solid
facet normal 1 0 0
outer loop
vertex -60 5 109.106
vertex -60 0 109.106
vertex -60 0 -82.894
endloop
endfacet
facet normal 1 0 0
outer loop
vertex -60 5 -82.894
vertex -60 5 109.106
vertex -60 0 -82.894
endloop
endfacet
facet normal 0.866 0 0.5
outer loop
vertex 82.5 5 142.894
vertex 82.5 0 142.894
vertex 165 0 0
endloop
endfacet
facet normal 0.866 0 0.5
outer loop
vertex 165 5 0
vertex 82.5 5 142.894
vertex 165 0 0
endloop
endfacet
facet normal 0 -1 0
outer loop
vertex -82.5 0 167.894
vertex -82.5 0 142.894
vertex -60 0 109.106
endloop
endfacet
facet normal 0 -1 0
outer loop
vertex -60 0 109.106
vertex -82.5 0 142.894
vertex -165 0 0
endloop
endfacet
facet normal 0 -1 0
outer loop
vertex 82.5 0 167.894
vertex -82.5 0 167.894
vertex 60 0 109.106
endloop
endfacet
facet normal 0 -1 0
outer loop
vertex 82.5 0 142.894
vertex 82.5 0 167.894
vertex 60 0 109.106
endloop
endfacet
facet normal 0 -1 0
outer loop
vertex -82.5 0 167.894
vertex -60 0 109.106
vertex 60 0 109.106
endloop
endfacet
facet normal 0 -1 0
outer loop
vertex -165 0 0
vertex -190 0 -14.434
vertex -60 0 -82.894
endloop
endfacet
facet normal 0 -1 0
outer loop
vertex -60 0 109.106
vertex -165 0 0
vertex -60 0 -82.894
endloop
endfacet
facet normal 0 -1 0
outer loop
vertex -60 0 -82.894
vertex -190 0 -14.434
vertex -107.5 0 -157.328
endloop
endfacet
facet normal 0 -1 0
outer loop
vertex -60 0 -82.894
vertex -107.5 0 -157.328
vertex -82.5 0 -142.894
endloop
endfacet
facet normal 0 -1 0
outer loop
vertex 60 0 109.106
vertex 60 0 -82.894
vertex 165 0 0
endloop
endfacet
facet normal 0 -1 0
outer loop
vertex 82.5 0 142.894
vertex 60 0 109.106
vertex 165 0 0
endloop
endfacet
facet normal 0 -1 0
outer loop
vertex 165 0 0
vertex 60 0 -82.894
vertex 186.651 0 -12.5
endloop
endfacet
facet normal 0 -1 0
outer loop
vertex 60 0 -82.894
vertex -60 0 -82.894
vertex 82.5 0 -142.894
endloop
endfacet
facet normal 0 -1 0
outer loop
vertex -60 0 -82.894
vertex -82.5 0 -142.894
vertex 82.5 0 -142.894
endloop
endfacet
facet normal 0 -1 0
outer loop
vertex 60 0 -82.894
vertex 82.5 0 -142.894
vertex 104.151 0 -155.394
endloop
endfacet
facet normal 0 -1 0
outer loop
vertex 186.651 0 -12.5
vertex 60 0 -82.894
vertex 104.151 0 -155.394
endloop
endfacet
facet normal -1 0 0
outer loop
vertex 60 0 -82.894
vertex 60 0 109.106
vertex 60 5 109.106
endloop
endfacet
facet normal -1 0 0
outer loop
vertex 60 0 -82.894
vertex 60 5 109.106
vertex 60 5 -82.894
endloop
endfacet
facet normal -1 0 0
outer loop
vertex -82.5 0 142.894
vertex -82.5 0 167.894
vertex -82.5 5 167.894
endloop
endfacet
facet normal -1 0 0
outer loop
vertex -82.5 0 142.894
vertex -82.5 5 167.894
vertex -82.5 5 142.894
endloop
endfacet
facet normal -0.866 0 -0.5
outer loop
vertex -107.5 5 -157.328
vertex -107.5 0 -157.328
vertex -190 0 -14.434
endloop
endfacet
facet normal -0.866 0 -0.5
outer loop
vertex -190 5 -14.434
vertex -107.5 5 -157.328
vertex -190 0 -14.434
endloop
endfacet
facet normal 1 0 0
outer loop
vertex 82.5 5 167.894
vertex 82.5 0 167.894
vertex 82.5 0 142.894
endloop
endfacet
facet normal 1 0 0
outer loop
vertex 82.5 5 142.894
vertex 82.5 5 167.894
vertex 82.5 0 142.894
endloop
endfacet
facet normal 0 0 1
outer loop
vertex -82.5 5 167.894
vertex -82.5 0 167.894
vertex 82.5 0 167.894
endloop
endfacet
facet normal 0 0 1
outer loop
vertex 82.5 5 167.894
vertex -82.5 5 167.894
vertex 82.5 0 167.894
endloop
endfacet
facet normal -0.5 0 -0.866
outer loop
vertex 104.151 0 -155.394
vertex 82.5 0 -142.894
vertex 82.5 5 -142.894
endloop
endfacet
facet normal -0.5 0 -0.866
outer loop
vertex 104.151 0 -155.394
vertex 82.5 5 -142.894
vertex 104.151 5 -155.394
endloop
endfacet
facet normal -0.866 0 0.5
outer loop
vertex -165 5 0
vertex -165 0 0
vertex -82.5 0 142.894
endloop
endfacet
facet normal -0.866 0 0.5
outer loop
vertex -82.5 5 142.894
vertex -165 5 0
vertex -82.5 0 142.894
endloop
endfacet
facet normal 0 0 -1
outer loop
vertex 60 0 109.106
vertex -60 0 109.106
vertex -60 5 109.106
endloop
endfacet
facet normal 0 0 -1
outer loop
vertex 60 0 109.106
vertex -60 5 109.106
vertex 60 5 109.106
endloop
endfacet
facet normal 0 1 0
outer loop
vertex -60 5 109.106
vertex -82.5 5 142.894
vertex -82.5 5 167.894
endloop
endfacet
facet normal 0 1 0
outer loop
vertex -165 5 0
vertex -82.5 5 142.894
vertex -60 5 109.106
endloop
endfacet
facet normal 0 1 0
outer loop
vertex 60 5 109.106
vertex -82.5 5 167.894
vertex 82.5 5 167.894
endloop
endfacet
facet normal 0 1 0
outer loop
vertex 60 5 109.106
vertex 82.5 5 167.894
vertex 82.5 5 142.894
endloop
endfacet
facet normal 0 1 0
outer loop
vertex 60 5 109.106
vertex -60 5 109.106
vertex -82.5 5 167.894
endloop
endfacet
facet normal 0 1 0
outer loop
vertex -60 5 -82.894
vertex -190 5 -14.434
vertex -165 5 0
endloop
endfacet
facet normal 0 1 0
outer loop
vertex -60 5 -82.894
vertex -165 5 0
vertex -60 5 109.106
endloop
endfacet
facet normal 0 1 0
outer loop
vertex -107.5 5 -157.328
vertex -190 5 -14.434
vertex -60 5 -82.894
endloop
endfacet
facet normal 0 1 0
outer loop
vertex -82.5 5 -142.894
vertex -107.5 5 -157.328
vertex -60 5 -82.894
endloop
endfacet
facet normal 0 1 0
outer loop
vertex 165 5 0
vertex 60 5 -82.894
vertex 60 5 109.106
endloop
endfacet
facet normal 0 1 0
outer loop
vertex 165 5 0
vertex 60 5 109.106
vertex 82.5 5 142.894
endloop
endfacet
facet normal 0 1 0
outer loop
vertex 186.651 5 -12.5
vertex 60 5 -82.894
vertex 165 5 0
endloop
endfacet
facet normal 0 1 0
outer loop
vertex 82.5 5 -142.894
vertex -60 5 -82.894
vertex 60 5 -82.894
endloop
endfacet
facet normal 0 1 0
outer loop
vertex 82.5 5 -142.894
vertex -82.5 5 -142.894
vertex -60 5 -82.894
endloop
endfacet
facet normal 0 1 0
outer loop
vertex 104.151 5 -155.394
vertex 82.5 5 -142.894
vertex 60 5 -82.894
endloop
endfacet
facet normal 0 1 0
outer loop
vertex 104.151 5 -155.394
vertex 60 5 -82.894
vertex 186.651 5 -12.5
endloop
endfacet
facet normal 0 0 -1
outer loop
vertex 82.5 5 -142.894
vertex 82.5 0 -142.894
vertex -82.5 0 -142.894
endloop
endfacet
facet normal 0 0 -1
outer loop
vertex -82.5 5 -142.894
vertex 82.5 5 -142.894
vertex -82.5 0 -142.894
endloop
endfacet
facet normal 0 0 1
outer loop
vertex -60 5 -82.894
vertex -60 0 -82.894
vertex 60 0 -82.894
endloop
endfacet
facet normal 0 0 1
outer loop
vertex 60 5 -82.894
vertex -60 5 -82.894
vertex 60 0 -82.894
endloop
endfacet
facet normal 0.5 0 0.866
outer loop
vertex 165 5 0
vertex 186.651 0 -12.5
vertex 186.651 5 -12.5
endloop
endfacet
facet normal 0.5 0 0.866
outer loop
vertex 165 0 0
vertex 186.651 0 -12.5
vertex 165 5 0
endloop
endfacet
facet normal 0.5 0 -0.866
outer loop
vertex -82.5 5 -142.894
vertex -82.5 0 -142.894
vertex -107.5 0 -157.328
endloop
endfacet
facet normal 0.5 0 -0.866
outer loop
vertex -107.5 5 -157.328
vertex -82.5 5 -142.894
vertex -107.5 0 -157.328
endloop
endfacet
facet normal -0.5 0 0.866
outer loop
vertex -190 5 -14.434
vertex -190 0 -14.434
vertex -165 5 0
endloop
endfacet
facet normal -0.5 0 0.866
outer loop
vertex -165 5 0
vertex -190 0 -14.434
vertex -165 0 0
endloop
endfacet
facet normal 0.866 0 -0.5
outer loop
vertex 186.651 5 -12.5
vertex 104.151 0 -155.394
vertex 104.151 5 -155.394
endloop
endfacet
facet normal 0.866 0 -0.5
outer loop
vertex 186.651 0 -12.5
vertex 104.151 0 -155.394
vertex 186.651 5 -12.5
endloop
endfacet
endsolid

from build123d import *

# Parameters (mm, degrees)
SKETCH1_W           = 120
SKETCH1_H           = 192
SKETCH1_W_2         = 165
SKETCH1_H_2         = 25
BOSS_EXTRUDE2_DEPTH = 5


with BuildPart() as part:
    # Sketch1 → Boss-Extrude2 (new body)
    with BuildSketch(Plane(origin=(0, 0, 0), x_dir=(1, 0, 0), z_dir=(0, 1, 0))):
        Polygon((-165, 0), (-82.5, -142.894191624), (82.5, -142.894191624), (165, 0), (82.5, 142.894191624), (-82.5, 142.894191624), align=None)
        with Locations((0, -13.105808376)):
            Rectangle(SKETCH1_W, SKETCH1_H, mode=Mode.SUBTRACT)
        Polygon((-82.5, 142.894191624), (-107.5, 157.327948354), (-190, 14.43375673), (-165, 0), align=None)
        Polygon((104.150635095, 155.394191624), (186.650635095, 12.5), (165, 0), (82.5, 142.894191624), align=None)
        with Locations((0, -155.394191624)):
            Rectangle(SKETCH1_W_2, SKETCH1_H_2)
    extrude(amount=BOSS_EXTRUDE2_DEPTH)


solid = part.part
